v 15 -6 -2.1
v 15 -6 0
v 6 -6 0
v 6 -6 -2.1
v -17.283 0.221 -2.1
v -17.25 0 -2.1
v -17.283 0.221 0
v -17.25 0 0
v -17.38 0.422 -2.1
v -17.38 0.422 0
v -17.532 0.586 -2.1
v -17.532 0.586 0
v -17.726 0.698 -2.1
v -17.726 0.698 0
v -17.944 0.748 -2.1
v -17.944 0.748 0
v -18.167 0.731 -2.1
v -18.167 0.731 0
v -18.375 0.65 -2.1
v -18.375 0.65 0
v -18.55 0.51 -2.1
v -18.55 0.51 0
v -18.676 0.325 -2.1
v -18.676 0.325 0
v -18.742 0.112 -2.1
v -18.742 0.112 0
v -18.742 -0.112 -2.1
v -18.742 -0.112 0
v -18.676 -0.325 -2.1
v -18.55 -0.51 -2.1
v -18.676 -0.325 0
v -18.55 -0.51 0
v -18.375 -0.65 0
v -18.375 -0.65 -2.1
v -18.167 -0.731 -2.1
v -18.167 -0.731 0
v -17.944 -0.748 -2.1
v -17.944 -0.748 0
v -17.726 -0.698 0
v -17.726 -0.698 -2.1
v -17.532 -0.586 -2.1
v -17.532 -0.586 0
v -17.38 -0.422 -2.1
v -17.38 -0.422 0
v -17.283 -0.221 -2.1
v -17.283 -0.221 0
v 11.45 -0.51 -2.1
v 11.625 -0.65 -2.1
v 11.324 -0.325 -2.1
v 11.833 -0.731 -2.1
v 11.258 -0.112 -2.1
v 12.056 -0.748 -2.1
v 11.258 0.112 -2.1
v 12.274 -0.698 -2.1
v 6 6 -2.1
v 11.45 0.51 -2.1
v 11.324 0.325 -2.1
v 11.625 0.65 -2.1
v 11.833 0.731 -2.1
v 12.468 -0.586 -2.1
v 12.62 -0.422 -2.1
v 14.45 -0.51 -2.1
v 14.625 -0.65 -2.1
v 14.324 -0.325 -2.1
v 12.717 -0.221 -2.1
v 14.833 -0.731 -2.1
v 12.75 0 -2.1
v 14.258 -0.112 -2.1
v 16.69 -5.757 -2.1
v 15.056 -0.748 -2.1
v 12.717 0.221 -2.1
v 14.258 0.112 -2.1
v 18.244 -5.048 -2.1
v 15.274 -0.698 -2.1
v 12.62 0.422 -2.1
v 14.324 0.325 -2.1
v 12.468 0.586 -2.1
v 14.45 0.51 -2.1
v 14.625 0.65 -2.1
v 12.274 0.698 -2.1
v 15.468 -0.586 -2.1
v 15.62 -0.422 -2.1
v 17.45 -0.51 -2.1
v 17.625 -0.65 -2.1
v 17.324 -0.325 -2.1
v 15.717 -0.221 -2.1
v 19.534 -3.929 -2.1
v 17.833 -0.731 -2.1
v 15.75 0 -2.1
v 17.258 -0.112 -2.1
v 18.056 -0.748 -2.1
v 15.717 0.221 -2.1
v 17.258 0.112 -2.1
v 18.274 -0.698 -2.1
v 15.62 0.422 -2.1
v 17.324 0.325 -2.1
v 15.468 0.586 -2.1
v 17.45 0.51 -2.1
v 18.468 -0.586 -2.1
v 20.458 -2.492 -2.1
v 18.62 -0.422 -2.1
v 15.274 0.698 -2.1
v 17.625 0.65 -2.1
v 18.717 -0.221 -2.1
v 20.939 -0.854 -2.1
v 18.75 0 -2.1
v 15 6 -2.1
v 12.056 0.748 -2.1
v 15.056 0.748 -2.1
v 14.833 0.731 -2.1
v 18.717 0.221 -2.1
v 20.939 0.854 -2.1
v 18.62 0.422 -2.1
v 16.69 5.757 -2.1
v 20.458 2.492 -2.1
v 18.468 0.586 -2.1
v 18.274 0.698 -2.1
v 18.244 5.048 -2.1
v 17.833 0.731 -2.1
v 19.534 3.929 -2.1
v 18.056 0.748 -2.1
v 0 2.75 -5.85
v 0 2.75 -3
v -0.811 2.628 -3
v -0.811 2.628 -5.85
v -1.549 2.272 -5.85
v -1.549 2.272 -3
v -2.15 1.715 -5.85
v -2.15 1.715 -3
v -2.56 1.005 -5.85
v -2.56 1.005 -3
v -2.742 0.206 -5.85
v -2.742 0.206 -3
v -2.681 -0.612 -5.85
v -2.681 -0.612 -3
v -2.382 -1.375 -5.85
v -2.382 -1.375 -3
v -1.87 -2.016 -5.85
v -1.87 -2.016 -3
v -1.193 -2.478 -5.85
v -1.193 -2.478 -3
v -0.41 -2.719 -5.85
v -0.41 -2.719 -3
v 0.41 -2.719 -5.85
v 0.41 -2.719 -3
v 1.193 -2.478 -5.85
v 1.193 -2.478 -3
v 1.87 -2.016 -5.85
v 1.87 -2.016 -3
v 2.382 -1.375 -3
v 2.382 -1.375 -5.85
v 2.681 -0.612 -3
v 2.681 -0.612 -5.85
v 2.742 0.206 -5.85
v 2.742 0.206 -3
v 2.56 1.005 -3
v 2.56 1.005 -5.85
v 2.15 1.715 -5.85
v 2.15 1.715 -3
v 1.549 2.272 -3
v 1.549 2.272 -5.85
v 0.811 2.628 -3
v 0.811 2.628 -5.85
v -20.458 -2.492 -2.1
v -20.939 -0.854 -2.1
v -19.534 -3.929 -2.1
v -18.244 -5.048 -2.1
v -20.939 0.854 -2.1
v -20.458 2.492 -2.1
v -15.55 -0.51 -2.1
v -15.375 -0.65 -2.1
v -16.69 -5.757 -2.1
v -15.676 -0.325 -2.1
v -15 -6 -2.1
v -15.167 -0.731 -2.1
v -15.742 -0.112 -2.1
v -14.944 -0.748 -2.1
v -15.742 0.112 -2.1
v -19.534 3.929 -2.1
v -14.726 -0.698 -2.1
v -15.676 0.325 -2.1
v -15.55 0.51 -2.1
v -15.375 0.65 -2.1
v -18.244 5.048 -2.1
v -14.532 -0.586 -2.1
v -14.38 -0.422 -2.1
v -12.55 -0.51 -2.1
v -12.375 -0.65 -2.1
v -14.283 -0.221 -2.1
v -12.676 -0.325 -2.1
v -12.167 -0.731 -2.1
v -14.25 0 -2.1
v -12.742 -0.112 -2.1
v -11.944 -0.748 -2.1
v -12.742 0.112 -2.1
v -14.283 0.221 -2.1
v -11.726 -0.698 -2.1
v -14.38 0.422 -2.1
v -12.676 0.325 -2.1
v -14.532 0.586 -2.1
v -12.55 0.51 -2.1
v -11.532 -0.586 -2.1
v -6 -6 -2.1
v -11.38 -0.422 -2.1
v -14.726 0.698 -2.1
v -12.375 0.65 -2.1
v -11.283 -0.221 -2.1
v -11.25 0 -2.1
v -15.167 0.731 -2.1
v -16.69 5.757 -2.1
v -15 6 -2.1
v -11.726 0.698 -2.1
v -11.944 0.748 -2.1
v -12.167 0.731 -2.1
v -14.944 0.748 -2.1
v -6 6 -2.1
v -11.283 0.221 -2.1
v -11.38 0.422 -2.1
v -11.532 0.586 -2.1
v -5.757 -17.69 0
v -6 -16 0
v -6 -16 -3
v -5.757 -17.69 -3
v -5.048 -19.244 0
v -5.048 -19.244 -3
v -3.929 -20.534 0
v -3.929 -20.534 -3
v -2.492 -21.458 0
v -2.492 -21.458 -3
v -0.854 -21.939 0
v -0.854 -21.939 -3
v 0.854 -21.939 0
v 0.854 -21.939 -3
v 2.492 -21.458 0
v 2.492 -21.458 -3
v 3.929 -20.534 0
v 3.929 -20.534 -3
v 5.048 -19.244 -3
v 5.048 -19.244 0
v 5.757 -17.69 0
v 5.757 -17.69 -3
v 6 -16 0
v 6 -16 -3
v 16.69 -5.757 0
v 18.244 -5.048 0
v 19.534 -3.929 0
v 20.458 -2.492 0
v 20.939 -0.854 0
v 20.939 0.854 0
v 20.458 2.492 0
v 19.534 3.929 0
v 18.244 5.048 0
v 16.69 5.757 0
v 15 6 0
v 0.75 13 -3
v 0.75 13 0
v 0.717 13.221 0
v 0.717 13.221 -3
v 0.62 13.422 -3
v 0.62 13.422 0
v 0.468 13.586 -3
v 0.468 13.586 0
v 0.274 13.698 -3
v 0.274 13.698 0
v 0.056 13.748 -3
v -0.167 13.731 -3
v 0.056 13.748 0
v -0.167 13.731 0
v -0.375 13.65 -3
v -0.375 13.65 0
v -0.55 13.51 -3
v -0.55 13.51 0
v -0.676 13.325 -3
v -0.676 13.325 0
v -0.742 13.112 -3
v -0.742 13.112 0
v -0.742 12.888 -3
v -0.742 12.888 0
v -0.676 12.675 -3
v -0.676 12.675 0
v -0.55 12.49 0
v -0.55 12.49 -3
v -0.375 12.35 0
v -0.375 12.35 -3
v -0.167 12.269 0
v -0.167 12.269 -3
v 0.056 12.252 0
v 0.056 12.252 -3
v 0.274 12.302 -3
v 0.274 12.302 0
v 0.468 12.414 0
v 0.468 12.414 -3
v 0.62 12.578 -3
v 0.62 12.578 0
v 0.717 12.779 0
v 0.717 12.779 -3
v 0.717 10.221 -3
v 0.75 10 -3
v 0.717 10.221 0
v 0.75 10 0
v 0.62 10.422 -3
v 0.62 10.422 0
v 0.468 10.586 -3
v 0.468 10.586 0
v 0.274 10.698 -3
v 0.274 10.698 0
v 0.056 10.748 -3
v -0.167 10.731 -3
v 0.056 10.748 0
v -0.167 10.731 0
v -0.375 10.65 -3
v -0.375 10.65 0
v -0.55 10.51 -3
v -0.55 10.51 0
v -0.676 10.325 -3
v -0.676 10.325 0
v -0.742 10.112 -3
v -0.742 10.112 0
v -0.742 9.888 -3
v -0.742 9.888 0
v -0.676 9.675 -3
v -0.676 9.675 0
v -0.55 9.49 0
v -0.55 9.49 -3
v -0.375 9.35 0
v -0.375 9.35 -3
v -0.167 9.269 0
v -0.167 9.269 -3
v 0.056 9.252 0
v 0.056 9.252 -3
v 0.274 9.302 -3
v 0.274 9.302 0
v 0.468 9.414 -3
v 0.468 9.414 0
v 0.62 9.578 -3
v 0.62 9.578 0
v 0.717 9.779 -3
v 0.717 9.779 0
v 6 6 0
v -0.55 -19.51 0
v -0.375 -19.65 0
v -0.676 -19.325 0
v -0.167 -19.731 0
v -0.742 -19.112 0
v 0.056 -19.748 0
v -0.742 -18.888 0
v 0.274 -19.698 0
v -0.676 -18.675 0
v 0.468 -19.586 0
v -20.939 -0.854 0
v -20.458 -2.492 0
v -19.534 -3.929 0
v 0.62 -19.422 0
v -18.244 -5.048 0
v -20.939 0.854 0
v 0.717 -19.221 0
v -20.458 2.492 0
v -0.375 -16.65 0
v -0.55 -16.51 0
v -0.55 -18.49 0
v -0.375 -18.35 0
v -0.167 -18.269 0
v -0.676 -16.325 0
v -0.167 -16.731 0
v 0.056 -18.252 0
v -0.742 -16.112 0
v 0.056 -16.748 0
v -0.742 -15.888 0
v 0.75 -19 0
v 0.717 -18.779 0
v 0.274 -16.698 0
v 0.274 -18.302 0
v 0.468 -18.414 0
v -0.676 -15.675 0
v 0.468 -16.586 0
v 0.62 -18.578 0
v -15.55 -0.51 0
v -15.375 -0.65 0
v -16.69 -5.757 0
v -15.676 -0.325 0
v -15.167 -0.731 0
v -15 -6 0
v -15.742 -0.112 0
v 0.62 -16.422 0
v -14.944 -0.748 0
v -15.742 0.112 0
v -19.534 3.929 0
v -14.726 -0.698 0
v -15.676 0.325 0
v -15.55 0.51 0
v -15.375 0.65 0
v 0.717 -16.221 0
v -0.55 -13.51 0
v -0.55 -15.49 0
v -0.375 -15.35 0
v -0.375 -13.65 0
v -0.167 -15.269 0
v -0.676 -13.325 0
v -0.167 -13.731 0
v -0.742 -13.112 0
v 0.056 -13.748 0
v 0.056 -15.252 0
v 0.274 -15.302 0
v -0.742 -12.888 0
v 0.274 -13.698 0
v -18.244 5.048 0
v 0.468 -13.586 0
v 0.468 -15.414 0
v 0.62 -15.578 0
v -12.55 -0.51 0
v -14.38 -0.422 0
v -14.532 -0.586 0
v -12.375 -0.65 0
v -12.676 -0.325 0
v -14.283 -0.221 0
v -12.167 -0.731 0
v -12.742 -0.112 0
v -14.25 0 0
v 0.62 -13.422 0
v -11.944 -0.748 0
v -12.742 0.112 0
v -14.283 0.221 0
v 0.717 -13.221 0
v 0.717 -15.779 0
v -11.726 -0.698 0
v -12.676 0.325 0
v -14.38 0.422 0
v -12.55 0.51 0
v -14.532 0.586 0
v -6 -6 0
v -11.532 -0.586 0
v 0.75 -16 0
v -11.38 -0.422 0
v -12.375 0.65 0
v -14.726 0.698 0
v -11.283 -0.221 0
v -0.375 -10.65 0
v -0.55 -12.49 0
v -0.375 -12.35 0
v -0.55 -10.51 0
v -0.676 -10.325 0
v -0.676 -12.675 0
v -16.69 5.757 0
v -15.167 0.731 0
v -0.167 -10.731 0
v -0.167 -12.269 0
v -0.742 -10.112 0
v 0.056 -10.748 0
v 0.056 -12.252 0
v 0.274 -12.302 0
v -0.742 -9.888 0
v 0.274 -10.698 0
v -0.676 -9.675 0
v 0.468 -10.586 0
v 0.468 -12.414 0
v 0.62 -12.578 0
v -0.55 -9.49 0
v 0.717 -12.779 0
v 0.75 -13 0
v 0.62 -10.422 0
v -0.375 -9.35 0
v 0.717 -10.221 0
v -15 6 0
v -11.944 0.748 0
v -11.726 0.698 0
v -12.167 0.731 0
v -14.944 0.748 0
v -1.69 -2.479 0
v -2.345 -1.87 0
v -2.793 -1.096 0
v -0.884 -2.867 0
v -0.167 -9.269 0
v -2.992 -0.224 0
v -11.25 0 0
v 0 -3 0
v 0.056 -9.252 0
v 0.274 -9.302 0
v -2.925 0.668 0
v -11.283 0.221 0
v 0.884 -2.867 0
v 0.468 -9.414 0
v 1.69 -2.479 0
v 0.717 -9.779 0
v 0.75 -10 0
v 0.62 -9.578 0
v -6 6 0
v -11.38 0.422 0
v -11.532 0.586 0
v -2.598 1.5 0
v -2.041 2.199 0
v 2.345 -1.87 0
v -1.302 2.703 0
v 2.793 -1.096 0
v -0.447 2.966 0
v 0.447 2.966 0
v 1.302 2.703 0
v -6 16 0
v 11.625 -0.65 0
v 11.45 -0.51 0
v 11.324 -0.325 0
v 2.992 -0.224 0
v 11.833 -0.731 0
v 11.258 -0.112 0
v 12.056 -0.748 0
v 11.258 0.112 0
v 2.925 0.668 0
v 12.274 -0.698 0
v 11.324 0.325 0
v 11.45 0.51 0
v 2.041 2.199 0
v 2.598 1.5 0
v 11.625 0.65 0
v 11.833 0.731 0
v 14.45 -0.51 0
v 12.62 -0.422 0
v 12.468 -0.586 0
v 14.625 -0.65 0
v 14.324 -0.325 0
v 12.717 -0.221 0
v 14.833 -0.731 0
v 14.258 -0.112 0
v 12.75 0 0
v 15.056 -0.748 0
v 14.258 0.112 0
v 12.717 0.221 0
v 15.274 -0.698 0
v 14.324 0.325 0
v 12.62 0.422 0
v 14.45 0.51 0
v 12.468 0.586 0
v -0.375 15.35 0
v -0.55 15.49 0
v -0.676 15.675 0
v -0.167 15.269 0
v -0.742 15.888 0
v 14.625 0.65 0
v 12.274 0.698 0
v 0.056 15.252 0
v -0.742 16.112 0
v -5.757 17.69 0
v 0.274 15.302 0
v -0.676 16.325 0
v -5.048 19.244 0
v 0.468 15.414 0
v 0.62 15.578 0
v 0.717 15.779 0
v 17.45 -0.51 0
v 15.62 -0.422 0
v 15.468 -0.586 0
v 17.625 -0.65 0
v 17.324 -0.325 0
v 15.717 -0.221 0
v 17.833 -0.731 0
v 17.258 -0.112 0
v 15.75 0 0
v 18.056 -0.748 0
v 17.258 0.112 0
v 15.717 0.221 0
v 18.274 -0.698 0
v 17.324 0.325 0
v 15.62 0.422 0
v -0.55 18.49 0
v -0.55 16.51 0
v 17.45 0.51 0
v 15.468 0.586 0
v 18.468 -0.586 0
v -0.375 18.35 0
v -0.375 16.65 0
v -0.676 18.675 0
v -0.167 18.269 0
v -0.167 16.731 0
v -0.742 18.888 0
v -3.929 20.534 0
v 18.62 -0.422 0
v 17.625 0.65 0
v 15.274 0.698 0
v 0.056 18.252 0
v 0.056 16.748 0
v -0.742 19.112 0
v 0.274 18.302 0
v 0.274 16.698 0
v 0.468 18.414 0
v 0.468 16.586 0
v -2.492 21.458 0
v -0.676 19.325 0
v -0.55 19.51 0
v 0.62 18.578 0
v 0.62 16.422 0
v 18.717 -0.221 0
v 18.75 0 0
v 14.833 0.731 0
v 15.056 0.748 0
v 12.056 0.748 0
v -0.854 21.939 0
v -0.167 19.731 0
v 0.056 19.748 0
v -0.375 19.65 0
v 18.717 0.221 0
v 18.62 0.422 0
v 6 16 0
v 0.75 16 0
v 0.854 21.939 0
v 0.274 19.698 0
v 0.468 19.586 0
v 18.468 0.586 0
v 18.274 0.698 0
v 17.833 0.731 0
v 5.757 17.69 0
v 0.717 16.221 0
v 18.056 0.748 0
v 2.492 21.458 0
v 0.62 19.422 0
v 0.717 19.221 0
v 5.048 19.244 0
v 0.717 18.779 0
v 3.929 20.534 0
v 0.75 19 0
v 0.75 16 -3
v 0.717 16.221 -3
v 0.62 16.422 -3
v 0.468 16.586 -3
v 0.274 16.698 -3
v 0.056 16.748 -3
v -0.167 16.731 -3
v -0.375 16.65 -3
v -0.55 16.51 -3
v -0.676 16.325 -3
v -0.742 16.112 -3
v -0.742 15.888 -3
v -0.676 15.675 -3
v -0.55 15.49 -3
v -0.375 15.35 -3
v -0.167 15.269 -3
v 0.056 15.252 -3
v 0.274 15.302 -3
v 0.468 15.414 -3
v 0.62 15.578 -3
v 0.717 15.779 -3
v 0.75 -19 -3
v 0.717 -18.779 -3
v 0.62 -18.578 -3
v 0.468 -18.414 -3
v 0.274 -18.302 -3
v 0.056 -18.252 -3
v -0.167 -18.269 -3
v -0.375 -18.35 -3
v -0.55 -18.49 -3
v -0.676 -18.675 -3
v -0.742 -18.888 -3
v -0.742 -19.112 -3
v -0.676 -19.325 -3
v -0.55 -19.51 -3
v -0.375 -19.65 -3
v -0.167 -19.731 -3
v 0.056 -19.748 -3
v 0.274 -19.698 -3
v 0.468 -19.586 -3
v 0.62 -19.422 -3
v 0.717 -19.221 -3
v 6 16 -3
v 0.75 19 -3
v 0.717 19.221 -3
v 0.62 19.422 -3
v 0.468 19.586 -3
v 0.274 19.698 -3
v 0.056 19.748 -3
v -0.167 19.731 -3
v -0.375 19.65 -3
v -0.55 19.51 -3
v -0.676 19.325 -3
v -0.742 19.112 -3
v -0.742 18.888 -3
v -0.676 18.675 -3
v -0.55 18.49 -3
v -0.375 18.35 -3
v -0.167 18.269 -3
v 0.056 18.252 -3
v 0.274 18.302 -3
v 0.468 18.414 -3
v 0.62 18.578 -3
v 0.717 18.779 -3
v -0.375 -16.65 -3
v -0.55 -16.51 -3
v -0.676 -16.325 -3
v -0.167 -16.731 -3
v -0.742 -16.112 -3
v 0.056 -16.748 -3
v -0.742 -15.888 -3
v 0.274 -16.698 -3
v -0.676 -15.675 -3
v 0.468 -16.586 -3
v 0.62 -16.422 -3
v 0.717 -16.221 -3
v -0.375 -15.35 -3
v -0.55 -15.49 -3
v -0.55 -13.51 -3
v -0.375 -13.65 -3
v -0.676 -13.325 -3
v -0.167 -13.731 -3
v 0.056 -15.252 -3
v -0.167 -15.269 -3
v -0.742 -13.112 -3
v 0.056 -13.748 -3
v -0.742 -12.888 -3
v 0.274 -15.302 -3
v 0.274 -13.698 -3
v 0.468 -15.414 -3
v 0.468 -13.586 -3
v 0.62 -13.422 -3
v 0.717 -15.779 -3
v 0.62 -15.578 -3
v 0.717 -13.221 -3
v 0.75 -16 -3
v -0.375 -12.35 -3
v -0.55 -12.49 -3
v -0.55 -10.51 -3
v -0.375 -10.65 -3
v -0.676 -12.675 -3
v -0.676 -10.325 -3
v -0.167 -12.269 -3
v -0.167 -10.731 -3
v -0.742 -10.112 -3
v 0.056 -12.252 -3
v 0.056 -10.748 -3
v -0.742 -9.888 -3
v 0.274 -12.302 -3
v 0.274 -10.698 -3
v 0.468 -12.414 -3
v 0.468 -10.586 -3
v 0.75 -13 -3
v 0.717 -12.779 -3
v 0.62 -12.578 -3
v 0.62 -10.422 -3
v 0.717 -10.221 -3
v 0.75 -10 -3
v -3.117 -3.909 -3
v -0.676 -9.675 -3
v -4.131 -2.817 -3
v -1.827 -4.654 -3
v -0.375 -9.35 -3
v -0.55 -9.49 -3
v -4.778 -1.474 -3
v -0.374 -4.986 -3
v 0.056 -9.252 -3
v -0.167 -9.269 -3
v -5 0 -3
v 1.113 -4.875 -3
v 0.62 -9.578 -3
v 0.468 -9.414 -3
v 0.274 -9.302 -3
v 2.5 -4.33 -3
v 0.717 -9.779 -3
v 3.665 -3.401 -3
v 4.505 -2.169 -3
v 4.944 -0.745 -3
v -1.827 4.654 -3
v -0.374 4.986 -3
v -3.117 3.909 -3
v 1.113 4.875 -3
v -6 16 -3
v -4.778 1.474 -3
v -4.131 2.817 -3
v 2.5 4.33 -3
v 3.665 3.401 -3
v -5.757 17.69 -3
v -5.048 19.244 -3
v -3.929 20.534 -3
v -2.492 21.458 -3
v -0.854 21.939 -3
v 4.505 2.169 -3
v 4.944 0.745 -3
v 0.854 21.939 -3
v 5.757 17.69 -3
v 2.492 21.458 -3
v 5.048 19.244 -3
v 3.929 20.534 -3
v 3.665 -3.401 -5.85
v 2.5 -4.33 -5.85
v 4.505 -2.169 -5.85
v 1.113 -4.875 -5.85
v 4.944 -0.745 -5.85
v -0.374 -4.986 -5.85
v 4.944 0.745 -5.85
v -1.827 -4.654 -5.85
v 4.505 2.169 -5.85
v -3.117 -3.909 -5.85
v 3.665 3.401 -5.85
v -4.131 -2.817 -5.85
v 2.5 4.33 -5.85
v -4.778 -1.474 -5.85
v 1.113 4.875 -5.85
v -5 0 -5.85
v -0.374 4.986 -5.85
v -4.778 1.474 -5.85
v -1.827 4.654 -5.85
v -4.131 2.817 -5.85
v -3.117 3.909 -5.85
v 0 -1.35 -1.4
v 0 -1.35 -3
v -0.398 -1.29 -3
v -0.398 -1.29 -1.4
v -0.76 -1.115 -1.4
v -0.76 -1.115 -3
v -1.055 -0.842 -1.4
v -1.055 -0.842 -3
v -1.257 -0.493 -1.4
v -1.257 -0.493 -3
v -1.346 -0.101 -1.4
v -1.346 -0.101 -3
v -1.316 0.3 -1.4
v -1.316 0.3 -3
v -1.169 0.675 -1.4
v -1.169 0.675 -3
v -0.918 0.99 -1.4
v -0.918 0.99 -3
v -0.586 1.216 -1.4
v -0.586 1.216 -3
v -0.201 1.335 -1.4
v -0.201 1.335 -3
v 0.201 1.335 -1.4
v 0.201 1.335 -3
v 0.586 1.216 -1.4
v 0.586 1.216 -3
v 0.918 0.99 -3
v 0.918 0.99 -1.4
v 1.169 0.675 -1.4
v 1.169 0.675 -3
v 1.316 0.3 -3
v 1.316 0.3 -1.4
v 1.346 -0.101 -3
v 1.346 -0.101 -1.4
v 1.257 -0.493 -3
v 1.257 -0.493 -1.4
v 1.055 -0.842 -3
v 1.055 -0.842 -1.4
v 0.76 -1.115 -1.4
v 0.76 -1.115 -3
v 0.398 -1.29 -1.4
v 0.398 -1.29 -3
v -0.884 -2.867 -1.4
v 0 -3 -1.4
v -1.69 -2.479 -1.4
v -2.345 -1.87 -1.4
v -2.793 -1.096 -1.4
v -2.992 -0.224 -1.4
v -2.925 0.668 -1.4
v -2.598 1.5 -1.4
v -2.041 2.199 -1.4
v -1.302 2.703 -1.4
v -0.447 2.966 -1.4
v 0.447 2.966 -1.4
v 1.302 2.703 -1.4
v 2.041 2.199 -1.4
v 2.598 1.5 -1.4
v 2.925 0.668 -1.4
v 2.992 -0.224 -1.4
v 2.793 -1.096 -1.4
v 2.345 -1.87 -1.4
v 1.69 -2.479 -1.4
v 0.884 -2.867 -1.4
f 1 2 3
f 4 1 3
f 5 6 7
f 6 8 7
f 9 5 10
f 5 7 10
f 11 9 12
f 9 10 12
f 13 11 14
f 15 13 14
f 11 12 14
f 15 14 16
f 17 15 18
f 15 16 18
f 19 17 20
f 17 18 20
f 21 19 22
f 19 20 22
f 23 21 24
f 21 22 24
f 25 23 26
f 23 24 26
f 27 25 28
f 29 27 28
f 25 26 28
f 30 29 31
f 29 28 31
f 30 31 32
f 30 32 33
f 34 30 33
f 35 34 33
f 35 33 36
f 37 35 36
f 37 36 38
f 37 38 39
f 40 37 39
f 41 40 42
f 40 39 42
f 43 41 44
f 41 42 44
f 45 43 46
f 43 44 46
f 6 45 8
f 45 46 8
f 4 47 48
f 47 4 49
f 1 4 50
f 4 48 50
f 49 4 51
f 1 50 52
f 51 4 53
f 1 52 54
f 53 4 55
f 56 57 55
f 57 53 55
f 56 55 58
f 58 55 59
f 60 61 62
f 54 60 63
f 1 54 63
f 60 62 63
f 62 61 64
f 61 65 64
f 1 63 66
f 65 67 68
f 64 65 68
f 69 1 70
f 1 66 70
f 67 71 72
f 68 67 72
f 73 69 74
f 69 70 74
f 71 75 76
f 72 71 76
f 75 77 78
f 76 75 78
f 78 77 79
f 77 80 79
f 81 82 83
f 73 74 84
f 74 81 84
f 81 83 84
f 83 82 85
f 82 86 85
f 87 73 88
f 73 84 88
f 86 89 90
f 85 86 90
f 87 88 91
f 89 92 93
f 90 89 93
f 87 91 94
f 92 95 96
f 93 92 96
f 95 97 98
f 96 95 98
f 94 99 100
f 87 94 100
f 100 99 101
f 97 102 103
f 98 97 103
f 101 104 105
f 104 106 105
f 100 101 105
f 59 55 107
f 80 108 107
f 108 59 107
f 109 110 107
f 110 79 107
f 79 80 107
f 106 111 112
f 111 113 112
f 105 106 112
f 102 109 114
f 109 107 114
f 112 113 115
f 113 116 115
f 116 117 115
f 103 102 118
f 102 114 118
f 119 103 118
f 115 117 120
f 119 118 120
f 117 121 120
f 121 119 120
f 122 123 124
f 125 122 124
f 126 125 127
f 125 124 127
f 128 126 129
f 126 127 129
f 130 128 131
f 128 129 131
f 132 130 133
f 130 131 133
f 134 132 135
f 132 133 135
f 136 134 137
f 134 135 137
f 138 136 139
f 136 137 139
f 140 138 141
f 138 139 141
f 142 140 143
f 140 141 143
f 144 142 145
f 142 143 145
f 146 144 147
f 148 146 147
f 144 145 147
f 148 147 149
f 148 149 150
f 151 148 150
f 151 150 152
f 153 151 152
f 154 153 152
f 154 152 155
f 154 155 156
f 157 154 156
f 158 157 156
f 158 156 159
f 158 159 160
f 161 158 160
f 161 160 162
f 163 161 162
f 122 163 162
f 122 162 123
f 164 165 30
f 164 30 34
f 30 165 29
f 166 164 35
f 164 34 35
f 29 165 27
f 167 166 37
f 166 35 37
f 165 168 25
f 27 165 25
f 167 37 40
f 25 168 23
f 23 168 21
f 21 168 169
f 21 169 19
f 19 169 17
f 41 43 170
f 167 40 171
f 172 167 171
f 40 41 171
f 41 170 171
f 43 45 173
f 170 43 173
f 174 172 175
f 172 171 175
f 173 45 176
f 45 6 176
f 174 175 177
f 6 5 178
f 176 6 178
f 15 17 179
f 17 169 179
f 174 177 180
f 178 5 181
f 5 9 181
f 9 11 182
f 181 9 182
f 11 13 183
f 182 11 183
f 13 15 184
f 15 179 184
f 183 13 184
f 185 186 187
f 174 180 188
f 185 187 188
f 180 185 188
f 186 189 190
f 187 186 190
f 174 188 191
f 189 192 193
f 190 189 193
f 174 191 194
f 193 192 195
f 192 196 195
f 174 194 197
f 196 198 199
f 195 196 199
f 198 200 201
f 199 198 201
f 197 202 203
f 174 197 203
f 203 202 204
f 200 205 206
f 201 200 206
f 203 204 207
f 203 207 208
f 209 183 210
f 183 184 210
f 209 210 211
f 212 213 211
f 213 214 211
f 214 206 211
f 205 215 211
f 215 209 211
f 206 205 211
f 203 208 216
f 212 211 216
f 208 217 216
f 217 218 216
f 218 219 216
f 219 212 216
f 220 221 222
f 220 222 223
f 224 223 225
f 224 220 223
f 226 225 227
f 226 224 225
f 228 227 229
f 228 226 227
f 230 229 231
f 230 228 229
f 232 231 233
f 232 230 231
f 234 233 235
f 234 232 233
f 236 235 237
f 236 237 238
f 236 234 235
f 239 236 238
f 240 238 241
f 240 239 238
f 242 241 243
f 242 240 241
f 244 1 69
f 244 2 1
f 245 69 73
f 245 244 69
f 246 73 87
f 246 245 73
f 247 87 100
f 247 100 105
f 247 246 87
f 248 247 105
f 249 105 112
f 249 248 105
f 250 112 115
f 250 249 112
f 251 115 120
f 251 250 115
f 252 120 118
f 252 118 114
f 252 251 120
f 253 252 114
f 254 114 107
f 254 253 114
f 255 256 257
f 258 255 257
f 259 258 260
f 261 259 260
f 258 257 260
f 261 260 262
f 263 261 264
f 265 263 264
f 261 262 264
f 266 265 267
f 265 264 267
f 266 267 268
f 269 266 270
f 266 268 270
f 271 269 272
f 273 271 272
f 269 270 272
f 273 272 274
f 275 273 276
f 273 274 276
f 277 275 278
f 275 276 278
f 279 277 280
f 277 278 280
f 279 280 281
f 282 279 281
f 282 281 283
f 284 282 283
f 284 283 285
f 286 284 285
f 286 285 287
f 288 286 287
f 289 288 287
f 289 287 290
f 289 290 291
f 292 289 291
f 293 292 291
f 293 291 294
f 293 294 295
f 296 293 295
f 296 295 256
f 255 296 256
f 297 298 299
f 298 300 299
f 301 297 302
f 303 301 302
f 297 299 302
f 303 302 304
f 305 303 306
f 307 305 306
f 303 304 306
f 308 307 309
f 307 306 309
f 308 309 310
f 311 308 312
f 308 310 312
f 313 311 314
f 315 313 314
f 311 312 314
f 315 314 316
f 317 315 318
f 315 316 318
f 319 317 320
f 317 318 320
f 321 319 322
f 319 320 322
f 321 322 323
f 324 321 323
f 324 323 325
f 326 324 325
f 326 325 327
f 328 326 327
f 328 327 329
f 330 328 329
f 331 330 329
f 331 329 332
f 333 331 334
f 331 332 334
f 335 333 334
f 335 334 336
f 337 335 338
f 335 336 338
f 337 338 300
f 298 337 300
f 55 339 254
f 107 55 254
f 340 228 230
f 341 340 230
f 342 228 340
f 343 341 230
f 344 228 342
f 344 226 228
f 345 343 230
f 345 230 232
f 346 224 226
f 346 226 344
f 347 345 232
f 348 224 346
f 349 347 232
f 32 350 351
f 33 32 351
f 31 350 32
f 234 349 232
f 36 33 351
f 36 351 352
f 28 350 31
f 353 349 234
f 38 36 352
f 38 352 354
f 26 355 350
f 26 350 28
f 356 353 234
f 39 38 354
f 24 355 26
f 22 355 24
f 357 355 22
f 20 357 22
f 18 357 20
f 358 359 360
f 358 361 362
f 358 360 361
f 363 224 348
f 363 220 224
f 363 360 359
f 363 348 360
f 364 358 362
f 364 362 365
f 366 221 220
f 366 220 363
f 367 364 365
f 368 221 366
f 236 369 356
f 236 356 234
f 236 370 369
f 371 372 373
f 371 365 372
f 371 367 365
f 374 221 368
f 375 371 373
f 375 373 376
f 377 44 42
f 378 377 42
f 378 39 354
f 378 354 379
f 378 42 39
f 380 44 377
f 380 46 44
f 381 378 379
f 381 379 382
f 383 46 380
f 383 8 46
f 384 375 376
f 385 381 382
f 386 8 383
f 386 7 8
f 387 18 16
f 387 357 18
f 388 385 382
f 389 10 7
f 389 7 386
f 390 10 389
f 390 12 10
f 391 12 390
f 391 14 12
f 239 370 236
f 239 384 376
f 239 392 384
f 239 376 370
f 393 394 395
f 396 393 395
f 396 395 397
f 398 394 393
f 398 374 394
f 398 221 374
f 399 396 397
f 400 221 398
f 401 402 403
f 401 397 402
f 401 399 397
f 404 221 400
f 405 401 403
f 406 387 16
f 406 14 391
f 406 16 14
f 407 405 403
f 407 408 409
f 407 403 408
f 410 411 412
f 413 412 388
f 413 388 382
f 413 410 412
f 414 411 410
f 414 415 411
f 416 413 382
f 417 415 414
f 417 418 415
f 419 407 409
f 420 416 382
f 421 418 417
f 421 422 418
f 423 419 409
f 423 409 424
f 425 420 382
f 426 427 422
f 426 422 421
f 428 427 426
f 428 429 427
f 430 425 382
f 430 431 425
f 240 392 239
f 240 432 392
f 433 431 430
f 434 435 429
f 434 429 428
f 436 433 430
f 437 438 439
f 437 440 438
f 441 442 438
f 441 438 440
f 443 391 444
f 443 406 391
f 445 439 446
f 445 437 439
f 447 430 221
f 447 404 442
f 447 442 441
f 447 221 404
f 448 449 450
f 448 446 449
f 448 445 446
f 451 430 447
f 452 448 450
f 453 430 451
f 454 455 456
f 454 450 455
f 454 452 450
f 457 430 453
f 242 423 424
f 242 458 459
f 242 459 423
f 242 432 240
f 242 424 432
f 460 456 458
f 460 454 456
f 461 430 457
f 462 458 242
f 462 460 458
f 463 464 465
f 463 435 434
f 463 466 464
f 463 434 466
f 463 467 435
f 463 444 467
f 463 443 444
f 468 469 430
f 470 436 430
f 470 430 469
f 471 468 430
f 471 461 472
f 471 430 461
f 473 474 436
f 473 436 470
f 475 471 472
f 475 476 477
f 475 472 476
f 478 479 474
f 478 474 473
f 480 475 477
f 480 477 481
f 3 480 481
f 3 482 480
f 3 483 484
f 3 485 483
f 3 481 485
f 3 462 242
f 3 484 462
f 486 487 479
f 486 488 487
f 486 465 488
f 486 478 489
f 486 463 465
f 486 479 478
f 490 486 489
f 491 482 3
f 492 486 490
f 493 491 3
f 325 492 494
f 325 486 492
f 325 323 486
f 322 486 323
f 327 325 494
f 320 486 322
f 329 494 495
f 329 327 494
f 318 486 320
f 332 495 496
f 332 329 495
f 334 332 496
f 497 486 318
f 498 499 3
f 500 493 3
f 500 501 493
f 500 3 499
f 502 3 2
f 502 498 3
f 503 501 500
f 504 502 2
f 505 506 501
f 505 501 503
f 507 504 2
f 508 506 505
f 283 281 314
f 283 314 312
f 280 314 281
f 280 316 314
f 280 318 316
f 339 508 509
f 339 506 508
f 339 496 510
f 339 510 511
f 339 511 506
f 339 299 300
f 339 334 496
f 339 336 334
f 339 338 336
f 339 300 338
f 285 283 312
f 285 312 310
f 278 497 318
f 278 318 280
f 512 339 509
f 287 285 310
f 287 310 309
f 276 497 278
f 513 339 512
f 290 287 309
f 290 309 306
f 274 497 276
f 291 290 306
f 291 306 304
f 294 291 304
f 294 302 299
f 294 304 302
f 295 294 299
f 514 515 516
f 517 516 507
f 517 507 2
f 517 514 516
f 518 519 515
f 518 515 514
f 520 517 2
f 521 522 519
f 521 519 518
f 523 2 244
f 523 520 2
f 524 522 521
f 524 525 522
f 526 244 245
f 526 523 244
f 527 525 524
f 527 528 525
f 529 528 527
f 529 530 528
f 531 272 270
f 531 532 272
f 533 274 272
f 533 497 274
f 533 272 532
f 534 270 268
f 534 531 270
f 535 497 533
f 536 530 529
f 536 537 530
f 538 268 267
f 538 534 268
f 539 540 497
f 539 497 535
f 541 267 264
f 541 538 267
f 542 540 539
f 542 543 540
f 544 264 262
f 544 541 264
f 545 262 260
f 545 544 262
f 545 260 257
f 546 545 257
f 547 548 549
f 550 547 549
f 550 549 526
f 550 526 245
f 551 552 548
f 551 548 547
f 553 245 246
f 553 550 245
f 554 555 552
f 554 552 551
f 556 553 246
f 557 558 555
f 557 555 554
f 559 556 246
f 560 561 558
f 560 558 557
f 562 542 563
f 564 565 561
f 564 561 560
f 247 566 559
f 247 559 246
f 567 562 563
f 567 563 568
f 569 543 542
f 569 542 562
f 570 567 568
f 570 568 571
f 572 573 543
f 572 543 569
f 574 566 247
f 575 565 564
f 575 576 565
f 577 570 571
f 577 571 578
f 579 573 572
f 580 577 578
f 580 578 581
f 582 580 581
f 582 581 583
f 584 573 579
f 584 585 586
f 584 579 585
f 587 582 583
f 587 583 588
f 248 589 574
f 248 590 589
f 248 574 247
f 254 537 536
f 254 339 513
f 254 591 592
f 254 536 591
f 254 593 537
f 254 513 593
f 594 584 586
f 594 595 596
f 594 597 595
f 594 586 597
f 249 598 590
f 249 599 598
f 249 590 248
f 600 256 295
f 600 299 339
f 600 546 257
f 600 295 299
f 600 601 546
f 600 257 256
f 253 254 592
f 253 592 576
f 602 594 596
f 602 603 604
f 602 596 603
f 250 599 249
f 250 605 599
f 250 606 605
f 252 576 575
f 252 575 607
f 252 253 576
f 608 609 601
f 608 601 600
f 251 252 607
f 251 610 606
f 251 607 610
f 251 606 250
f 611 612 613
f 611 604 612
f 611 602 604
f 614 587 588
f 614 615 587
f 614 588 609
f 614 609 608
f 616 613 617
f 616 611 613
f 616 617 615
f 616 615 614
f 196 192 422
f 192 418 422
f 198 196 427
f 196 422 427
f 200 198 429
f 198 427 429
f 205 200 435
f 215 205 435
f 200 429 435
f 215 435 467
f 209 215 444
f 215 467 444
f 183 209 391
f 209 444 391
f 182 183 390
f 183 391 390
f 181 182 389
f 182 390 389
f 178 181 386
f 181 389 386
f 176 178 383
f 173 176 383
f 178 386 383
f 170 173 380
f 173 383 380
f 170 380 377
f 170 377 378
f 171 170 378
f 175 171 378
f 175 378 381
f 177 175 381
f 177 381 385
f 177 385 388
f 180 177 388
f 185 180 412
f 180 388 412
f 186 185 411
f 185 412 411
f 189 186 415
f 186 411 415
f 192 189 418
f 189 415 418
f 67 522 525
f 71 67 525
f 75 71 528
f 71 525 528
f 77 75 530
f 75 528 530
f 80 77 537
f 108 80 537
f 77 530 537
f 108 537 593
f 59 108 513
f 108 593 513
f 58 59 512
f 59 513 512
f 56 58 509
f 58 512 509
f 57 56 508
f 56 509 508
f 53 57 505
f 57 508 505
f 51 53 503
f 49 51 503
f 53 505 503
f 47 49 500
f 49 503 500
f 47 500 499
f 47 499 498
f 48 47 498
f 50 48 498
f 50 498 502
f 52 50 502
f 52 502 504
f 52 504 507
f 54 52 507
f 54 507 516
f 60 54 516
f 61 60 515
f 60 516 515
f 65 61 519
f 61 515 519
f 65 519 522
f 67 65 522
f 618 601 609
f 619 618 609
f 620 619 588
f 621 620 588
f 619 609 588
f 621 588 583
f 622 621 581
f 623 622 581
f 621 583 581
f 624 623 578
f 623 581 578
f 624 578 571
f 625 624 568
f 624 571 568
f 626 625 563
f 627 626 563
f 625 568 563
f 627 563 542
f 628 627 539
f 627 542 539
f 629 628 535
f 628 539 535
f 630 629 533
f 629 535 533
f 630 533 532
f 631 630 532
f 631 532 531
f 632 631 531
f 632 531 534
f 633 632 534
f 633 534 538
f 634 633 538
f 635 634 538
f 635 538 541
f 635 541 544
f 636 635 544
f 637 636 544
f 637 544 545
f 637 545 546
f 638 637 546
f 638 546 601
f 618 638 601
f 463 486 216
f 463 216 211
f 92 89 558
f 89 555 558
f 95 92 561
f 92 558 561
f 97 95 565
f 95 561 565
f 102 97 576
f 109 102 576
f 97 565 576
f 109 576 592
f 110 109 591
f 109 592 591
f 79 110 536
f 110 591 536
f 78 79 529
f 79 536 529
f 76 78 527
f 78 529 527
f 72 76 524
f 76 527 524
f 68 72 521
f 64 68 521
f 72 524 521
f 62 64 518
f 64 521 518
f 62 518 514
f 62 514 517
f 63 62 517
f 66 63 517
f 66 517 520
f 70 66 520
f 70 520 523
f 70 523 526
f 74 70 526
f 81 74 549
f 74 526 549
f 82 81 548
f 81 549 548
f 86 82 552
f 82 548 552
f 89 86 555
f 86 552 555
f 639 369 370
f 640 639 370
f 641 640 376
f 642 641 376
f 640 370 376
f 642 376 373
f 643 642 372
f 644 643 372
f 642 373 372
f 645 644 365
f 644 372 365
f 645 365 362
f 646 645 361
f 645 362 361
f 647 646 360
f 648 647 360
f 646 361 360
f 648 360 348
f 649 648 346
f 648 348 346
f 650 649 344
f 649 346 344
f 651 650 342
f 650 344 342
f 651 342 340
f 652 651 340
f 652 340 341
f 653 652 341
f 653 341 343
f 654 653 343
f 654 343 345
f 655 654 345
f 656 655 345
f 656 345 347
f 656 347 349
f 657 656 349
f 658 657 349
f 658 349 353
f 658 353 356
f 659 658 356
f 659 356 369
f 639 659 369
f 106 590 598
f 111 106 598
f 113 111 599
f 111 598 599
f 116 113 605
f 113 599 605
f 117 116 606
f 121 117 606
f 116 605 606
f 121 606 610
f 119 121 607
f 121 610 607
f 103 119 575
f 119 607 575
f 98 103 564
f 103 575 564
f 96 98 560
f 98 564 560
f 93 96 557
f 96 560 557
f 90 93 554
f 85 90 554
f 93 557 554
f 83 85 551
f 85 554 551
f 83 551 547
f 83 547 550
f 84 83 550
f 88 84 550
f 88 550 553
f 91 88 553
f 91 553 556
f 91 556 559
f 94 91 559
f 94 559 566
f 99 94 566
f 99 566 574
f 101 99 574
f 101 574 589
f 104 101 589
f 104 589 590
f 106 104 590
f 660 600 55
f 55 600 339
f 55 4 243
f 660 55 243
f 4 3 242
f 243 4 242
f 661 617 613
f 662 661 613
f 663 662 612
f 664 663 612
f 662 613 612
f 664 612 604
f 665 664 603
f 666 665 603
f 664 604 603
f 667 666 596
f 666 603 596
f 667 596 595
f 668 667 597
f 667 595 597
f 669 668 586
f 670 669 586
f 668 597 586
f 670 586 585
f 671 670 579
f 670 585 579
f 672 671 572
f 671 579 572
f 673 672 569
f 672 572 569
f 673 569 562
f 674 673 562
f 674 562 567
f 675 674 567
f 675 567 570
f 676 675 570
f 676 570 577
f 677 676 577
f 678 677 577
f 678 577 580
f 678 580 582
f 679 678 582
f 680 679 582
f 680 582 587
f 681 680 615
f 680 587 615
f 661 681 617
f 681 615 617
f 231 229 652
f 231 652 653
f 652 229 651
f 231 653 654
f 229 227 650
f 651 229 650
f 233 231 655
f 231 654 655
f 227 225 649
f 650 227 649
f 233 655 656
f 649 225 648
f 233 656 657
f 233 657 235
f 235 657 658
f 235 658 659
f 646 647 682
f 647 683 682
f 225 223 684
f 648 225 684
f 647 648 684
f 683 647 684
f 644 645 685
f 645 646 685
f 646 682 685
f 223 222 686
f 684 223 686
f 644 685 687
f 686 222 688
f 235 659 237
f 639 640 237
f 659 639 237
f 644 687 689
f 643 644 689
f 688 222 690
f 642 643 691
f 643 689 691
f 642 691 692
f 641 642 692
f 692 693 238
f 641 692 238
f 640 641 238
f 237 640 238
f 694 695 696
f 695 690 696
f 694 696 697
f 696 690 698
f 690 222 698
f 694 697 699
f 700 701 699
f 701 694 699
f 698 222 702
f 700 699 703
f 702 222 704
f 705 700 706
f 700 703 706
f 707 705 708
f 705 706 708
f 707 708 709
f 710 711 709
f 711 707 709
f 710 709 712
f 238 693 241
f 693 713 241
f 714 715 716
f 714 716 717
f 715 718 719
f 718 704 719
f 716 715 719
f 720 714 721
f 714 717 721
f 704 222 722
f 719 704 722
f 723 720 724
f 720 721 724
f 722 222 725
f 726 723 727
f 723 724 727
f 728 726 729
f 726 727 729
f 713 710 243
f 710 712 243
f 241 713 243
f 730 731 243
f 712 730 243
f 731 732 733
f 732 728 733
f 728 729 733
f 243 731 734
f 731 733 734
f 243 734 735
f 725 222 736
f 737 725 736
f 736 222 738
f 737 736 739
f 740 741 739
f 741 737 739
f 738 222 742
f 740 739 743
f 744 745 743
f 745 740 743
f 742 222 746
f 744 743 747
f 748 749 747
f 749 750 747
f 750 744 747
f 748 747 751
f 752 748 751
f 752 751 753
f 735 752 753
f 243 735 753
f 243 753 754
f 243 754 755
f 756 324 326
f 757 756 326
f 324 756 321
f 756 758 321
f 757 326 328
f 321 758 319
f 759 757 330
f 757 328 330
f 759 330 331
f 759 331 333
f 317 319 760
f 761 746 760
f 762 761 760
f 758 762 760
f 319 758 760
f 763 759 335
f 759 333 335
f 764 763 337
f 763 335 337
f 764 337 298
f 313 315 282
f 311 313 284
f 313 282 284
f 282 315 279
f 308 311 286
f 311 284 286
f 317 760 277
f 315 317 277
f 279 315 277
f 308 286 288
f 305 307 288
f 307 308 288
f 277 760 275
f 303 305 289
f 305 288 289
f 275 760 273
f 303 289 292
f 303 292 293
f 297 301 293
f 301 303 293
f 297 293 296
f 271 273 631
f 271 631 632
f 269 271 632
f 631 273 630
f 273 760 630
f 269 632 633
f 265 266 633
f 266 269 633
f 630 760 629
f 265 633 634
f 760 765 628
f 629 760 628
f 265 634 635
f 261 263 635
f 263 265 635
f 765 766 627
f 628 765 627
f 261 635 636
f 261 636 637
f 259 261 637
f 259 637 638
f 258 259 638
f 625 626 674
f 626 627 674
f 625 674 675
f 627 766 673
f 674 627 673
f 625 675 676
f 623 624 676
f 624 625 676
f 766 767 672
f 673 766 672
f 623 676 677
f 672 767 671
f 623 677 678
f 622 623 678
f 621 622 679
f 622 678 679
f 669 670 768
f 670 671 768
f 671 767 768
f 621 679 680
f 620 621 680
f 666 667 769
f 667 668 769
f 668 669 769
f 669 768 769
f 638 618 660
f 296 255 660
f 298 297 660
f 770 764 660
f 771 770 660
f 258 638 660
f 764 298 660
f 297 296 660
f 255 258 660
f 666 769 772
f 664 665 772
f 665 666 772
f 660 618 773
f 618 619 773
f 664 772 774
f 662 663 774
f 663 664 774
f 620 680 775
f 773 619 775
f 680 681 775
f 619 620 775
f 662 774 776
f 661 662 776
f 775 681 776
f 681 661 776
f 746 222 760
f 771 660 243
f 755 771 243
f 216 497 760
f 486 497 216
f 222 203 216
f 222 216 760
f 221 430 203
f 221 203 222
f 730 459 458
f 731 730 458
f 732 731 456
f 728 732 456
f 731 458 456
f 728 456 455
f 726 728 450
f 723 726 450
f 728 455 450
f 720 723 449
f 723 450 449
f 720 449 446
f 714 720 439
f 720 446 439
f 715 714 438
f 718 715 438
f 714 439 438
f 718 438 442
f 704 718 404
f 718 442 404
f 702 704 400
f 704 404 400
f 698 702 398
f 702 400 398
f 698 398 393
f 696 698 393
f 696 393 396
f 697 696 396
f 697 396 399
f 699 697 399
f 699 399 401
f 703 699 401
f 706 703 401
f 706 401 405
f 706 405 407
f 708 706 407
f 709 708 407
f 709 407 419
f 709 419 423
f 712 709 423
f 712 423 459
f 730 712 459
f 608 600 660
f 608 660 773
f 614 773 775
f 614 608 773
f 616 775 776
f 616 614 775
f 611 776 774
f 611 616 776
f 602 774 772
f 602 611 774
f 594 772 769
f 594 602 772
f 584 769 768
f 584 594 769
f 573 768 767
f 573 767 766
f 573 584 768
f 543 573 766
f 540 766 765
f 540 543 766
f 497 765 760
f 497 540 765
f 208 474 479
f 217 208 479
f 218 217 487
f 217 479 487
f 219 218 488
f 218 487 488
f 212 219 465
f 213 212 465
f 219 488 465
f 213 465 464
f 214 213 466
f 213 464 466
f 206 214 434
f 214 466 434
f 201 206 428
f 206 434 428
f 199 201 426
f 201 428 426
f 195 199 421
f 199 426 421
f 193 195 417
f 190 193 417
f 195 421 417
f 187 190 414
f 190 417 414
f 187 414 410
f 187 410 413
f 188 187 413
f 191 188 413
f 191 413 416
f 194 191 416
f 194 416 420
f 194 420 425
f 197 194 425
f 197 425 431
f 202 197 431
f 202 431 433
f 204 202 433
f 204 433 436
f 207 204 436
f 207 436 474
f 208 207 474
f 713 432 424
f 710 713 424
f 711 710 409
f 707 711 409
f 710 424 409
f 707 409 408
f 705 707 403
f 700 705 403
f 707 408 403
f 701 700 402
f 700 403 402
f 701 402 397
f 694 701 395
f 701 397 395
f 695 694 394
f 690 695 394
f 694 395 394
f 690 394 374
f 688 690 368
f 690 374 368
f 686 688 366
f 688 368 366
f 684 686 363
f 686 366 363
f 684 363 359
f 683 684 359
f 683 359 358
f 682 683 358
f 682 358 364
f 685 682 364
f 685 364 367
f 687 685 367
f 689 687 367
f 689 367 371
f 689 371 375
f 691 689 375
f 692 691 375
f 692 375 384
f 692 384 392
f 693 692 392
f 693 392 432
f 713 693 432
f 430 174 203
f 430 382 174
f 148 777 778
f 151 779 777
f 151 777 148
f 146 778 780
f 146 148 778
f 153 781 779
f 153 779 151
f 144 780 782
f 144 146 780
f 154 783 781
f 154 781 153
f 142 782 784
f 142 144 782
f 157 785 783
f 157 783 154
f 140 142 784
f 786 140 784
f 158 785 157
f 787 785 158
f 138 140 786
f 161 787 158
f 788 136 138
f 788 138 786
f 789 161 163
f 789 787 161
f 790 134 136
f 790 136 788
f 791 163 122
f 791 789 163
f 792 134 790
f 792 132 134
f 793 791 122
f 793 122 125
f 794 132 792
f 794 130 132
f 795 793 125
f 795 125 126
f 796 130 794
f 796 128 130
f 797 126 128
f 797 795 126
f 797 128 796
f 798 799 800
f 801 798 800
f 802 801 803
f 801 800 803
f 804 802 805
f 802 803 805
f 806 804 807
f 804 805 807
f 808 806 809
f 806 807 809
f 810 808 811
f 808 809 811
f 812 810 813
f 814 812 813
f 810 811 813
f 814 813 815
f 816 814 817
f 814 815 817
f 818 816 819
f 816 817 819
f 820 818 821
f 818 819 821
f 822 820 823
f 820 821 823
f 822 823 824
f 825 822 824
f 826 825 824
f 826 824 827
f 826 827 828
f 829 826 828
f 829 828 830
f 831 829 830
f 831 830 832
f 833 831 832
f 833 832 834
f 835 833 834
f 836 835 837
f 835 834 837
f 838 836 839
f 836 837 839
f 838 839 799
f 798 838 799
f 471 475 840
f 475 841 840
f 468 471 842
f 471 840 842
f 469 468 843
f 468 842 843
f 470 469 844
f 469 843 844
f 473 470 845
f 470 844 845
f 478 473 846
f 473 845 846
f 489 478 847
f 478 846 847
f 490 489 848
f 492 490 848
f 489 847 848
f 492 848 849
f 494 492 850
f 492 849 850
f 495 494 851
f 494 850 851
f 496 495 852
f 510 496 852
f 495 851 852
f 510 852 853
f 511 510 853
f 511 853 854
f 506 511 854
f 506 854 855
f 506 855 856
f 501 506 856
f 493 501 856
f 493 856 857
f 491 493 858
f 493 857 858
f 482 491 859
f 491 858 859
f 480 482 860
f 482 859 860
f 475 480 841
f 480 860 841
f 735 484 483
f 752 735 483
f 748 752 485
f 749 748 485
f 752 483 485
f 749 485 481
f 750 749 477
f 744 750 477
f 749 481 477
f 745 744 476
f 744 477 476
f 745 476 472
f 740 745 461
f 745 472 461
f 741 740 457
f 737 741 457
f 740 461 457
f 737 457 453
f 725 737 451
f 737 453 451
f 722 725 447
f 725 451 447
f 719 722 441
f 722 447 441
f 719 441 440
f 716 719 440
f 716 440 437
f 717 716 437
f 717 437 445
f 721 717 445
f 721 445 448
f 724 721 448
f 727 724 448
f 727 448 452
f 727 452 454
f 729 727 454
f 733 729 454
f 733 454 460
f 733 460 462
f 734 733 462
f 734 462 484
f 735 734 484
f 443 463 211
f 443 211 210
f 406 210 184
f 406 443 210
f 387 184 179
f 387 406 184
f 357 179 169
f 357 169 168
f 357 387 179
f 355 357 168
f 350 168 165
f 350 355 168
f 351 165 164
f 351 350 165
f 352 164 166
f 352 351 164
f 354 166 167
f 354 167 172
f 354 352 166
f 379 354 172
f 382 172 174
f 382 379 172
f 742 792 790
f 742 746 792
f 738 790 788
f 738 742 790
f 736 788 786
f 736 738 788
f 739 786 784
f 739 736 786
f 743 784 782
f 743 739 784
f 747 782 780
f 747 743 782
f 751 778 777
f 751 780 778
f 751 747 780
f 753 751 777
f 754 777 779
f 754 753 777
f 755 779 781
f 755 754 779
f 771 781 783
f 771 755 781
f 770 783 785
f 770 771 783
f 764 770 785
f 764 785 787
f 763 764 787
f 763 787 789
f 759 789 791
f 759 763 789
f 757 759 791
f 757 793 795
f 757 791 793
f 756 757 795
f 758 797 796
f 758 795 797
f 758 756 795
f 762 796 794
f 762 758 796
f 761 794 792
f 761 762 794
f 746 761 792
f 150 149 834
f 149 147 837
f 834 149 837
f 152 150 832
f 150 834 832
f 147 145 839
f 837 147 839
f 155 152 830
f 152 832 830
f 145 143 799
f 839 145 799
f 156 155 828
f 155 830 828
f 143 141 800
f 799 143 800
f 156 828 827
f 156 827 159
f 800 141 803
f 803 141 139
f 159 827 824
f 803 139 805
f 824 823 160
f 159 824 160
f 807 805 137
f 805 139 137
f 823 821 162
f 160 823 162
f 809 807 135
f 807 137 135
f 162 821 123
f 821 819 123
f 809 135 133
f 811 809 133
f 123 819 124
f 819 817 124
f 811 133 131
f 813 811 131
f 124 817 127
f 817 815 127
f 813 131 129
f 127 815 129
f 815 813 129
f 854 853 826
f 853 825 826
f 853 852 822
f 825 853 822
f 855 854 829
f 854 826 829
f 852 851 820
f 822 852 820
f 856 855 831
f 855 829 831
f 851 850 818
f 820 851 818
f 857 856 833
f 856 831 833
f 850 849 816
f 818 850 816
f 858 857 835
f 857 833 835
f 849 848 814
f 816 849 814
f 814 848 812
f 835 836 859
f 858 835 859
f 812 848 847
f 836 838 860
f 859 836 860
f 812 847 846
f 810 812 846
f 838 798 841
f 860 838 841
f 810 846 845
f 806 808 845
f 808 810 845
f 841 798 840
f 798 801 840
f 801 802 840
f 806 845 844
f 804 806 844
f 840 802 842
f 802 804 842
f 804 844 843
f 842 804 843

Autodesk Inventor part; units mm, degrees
ref_plane "YZ Plane" through (0, 0, 0) normal (1, 0, 0) x (0, 1, 0)
ref_plane "XZ Plane" through (0, 0, 0) normal (0, 1, 0) x (-1, 0, 0)
ref_plane "XY Plane" through (0, 0, 0) normal (0, 0, 1) x (1, 0, 0)
sketch "Sketch1" plane through (0, 0, 0) normal (0, 0, 1) x (1, 0, 0)
  arc A0 (6, 16) -> (-6, 16) centre (0, 16) ccw
  line L0 (0, -30.8) -> (0, 30.8) construction
  line L1 (-6, 16) -> (-6, 6)
  line L2 (6, 16) -> (6, 6)
  circle A1 centre (0, 13) radius 0.75
  circle A2 centre (0, 10) radius 0.75
  circle A3 centre (0, 19) radius 0.75
  circle A4 centre (0, 16) radius 0.75
  line L3 (-7.8151, 0) -> (8.8196, 0) construction
  arc A5 (-6, -16) -> (6, -16) centre (0, -16) ccw
  line L4 (-6, -16) -> (-6, -6)
  line L5 (6, -16) -> (6, -6)
  circle A6 centre (0, -13) radius 0.75
  circle A7 centre (0, -10) radius 0.75
  circle A8 centre (0, -19) radius 0.75
  circle A9 centre (0, -16) radius 0.75
  line L6 (6, 6) -> (15, 6)
  arc A10 (15, -6) -> (15, 6) centre (15, 0) ccw
  line L7 (15, 6) -> (15, -6) construction
  line L8 (15, 6) -> (27, 6) construction
  line L9 (15, -6) -> (6, -6)
  circle A11 centre (18, 0) radius 0.75
  circle A12 centre (15, 0) radius 0.75
  circle A13 centre (12, 0) radius 0.75
  line L10 (7.8151, 0) -> (-8.8196, 0) construction
  line L11 (-6, 6) -> (-15, 6)
  arc A14 (-15, 6) -> (-15, -6) centre (-15, 0) ccw
  line L12 (-15, 6) -> (-15, -6) construction
  line L13 (-15, -6) -> (-6, -6)
  circle A15 centre (-18, 0) radius 0.75
  circle A16 centre (-15, 0) radius 0.75
  circle A17 centre (-12, 0) radius 0.75
  line L14 (6, 6) -> (6, -6)
  line L15 (-6, 6) -> (-6, -6)
  point P0 (0, 0)
  dimension "d0" = 12
  dimension "d1" = 6
  dimension "d2" = 10
  dimension "d3" = 10
  dimension "d5" = 1.5
  dimension "d6" = 1.5
  dimension "d8" = 1.5
  dimension "d9" = 13
  dimension "d10" = 10
  dimension "d11" = 19
  dimension "d12" = 1.5
  dimension "d13" = 16
  dimension "d14" = 16
  dimension "d15" = 10
  dimension "d16" = 90
  dimension "d17" = 6
  dimension "d18" = 15
  dimension "d19" = 12
  dimension "d20" = 15
  dimension "d21" = 18
  dimension "d22" = 1.5
  dimension "d23" = 1.5
  dimension "d24" = 1.5
  dimension "d25" = 6
  dimension "d26" = 6
extrude "Extrusion1" add sketch "Sketch1" against normal blind 3 contours L2 L14 L5 A5 L4 L15 L1 A0
extrude "Extrusion2" add sketch "Sketch1" against normal blind 2.1 contours L6 A10 L9 L14 | L15 L13 A14 L11
sketch "Sketch2" plane through (0, 0, -3) normal (0, 0, -1) x (-1, 0, 0)
  circle A0 centre (0, 0) radius 5
  dimension "d31" = 10
extrude "Extrusion3" add sketch "Sketch2" along normal blind 2.85
sketch "Sketch3" plane through (0, 0, -5.85) normal (0, 0, -1) x (-1, 0, 0)
  point P0 (0, 0)
  point P1 (0, 0)
hole "Hole1" at (0, 0, -5.85) direction (0, 0, 1) diameter 5.5 depth 2.85
sketch "Sketch6" plane through (0, 0, 0) normal (0, 0, 1) x (1, 0, 0)
  point P0 (0, 0)
  point P1 (0, 0)
hole "Hole2" at (0, 0, 0) direction (0, 0, -1) diameter 6 depth 1.4
sketch "Sketch7" plane through (0, 0, -1.4) normal (0, 0, 1) x (1, 0, 0)
  point P0 (0, 0)
  point P1 (0, 0)
hole "Hole3" at (0, 0, -1.4) direction (0, 0, -1) diameter 2.7 end through all
equation "\"d2\" = d3"
equation "\"d5\" = d8"
equation "\"d6\" = d8"
equation "\"d12\" = d8"
equation "\"d15\" = d10"
equation "\"d22\" = d8"
equation "\"d23\" = d8"
equation "\"d24\" = d8"
properties part number "Servo Horn 3 Skiba"
